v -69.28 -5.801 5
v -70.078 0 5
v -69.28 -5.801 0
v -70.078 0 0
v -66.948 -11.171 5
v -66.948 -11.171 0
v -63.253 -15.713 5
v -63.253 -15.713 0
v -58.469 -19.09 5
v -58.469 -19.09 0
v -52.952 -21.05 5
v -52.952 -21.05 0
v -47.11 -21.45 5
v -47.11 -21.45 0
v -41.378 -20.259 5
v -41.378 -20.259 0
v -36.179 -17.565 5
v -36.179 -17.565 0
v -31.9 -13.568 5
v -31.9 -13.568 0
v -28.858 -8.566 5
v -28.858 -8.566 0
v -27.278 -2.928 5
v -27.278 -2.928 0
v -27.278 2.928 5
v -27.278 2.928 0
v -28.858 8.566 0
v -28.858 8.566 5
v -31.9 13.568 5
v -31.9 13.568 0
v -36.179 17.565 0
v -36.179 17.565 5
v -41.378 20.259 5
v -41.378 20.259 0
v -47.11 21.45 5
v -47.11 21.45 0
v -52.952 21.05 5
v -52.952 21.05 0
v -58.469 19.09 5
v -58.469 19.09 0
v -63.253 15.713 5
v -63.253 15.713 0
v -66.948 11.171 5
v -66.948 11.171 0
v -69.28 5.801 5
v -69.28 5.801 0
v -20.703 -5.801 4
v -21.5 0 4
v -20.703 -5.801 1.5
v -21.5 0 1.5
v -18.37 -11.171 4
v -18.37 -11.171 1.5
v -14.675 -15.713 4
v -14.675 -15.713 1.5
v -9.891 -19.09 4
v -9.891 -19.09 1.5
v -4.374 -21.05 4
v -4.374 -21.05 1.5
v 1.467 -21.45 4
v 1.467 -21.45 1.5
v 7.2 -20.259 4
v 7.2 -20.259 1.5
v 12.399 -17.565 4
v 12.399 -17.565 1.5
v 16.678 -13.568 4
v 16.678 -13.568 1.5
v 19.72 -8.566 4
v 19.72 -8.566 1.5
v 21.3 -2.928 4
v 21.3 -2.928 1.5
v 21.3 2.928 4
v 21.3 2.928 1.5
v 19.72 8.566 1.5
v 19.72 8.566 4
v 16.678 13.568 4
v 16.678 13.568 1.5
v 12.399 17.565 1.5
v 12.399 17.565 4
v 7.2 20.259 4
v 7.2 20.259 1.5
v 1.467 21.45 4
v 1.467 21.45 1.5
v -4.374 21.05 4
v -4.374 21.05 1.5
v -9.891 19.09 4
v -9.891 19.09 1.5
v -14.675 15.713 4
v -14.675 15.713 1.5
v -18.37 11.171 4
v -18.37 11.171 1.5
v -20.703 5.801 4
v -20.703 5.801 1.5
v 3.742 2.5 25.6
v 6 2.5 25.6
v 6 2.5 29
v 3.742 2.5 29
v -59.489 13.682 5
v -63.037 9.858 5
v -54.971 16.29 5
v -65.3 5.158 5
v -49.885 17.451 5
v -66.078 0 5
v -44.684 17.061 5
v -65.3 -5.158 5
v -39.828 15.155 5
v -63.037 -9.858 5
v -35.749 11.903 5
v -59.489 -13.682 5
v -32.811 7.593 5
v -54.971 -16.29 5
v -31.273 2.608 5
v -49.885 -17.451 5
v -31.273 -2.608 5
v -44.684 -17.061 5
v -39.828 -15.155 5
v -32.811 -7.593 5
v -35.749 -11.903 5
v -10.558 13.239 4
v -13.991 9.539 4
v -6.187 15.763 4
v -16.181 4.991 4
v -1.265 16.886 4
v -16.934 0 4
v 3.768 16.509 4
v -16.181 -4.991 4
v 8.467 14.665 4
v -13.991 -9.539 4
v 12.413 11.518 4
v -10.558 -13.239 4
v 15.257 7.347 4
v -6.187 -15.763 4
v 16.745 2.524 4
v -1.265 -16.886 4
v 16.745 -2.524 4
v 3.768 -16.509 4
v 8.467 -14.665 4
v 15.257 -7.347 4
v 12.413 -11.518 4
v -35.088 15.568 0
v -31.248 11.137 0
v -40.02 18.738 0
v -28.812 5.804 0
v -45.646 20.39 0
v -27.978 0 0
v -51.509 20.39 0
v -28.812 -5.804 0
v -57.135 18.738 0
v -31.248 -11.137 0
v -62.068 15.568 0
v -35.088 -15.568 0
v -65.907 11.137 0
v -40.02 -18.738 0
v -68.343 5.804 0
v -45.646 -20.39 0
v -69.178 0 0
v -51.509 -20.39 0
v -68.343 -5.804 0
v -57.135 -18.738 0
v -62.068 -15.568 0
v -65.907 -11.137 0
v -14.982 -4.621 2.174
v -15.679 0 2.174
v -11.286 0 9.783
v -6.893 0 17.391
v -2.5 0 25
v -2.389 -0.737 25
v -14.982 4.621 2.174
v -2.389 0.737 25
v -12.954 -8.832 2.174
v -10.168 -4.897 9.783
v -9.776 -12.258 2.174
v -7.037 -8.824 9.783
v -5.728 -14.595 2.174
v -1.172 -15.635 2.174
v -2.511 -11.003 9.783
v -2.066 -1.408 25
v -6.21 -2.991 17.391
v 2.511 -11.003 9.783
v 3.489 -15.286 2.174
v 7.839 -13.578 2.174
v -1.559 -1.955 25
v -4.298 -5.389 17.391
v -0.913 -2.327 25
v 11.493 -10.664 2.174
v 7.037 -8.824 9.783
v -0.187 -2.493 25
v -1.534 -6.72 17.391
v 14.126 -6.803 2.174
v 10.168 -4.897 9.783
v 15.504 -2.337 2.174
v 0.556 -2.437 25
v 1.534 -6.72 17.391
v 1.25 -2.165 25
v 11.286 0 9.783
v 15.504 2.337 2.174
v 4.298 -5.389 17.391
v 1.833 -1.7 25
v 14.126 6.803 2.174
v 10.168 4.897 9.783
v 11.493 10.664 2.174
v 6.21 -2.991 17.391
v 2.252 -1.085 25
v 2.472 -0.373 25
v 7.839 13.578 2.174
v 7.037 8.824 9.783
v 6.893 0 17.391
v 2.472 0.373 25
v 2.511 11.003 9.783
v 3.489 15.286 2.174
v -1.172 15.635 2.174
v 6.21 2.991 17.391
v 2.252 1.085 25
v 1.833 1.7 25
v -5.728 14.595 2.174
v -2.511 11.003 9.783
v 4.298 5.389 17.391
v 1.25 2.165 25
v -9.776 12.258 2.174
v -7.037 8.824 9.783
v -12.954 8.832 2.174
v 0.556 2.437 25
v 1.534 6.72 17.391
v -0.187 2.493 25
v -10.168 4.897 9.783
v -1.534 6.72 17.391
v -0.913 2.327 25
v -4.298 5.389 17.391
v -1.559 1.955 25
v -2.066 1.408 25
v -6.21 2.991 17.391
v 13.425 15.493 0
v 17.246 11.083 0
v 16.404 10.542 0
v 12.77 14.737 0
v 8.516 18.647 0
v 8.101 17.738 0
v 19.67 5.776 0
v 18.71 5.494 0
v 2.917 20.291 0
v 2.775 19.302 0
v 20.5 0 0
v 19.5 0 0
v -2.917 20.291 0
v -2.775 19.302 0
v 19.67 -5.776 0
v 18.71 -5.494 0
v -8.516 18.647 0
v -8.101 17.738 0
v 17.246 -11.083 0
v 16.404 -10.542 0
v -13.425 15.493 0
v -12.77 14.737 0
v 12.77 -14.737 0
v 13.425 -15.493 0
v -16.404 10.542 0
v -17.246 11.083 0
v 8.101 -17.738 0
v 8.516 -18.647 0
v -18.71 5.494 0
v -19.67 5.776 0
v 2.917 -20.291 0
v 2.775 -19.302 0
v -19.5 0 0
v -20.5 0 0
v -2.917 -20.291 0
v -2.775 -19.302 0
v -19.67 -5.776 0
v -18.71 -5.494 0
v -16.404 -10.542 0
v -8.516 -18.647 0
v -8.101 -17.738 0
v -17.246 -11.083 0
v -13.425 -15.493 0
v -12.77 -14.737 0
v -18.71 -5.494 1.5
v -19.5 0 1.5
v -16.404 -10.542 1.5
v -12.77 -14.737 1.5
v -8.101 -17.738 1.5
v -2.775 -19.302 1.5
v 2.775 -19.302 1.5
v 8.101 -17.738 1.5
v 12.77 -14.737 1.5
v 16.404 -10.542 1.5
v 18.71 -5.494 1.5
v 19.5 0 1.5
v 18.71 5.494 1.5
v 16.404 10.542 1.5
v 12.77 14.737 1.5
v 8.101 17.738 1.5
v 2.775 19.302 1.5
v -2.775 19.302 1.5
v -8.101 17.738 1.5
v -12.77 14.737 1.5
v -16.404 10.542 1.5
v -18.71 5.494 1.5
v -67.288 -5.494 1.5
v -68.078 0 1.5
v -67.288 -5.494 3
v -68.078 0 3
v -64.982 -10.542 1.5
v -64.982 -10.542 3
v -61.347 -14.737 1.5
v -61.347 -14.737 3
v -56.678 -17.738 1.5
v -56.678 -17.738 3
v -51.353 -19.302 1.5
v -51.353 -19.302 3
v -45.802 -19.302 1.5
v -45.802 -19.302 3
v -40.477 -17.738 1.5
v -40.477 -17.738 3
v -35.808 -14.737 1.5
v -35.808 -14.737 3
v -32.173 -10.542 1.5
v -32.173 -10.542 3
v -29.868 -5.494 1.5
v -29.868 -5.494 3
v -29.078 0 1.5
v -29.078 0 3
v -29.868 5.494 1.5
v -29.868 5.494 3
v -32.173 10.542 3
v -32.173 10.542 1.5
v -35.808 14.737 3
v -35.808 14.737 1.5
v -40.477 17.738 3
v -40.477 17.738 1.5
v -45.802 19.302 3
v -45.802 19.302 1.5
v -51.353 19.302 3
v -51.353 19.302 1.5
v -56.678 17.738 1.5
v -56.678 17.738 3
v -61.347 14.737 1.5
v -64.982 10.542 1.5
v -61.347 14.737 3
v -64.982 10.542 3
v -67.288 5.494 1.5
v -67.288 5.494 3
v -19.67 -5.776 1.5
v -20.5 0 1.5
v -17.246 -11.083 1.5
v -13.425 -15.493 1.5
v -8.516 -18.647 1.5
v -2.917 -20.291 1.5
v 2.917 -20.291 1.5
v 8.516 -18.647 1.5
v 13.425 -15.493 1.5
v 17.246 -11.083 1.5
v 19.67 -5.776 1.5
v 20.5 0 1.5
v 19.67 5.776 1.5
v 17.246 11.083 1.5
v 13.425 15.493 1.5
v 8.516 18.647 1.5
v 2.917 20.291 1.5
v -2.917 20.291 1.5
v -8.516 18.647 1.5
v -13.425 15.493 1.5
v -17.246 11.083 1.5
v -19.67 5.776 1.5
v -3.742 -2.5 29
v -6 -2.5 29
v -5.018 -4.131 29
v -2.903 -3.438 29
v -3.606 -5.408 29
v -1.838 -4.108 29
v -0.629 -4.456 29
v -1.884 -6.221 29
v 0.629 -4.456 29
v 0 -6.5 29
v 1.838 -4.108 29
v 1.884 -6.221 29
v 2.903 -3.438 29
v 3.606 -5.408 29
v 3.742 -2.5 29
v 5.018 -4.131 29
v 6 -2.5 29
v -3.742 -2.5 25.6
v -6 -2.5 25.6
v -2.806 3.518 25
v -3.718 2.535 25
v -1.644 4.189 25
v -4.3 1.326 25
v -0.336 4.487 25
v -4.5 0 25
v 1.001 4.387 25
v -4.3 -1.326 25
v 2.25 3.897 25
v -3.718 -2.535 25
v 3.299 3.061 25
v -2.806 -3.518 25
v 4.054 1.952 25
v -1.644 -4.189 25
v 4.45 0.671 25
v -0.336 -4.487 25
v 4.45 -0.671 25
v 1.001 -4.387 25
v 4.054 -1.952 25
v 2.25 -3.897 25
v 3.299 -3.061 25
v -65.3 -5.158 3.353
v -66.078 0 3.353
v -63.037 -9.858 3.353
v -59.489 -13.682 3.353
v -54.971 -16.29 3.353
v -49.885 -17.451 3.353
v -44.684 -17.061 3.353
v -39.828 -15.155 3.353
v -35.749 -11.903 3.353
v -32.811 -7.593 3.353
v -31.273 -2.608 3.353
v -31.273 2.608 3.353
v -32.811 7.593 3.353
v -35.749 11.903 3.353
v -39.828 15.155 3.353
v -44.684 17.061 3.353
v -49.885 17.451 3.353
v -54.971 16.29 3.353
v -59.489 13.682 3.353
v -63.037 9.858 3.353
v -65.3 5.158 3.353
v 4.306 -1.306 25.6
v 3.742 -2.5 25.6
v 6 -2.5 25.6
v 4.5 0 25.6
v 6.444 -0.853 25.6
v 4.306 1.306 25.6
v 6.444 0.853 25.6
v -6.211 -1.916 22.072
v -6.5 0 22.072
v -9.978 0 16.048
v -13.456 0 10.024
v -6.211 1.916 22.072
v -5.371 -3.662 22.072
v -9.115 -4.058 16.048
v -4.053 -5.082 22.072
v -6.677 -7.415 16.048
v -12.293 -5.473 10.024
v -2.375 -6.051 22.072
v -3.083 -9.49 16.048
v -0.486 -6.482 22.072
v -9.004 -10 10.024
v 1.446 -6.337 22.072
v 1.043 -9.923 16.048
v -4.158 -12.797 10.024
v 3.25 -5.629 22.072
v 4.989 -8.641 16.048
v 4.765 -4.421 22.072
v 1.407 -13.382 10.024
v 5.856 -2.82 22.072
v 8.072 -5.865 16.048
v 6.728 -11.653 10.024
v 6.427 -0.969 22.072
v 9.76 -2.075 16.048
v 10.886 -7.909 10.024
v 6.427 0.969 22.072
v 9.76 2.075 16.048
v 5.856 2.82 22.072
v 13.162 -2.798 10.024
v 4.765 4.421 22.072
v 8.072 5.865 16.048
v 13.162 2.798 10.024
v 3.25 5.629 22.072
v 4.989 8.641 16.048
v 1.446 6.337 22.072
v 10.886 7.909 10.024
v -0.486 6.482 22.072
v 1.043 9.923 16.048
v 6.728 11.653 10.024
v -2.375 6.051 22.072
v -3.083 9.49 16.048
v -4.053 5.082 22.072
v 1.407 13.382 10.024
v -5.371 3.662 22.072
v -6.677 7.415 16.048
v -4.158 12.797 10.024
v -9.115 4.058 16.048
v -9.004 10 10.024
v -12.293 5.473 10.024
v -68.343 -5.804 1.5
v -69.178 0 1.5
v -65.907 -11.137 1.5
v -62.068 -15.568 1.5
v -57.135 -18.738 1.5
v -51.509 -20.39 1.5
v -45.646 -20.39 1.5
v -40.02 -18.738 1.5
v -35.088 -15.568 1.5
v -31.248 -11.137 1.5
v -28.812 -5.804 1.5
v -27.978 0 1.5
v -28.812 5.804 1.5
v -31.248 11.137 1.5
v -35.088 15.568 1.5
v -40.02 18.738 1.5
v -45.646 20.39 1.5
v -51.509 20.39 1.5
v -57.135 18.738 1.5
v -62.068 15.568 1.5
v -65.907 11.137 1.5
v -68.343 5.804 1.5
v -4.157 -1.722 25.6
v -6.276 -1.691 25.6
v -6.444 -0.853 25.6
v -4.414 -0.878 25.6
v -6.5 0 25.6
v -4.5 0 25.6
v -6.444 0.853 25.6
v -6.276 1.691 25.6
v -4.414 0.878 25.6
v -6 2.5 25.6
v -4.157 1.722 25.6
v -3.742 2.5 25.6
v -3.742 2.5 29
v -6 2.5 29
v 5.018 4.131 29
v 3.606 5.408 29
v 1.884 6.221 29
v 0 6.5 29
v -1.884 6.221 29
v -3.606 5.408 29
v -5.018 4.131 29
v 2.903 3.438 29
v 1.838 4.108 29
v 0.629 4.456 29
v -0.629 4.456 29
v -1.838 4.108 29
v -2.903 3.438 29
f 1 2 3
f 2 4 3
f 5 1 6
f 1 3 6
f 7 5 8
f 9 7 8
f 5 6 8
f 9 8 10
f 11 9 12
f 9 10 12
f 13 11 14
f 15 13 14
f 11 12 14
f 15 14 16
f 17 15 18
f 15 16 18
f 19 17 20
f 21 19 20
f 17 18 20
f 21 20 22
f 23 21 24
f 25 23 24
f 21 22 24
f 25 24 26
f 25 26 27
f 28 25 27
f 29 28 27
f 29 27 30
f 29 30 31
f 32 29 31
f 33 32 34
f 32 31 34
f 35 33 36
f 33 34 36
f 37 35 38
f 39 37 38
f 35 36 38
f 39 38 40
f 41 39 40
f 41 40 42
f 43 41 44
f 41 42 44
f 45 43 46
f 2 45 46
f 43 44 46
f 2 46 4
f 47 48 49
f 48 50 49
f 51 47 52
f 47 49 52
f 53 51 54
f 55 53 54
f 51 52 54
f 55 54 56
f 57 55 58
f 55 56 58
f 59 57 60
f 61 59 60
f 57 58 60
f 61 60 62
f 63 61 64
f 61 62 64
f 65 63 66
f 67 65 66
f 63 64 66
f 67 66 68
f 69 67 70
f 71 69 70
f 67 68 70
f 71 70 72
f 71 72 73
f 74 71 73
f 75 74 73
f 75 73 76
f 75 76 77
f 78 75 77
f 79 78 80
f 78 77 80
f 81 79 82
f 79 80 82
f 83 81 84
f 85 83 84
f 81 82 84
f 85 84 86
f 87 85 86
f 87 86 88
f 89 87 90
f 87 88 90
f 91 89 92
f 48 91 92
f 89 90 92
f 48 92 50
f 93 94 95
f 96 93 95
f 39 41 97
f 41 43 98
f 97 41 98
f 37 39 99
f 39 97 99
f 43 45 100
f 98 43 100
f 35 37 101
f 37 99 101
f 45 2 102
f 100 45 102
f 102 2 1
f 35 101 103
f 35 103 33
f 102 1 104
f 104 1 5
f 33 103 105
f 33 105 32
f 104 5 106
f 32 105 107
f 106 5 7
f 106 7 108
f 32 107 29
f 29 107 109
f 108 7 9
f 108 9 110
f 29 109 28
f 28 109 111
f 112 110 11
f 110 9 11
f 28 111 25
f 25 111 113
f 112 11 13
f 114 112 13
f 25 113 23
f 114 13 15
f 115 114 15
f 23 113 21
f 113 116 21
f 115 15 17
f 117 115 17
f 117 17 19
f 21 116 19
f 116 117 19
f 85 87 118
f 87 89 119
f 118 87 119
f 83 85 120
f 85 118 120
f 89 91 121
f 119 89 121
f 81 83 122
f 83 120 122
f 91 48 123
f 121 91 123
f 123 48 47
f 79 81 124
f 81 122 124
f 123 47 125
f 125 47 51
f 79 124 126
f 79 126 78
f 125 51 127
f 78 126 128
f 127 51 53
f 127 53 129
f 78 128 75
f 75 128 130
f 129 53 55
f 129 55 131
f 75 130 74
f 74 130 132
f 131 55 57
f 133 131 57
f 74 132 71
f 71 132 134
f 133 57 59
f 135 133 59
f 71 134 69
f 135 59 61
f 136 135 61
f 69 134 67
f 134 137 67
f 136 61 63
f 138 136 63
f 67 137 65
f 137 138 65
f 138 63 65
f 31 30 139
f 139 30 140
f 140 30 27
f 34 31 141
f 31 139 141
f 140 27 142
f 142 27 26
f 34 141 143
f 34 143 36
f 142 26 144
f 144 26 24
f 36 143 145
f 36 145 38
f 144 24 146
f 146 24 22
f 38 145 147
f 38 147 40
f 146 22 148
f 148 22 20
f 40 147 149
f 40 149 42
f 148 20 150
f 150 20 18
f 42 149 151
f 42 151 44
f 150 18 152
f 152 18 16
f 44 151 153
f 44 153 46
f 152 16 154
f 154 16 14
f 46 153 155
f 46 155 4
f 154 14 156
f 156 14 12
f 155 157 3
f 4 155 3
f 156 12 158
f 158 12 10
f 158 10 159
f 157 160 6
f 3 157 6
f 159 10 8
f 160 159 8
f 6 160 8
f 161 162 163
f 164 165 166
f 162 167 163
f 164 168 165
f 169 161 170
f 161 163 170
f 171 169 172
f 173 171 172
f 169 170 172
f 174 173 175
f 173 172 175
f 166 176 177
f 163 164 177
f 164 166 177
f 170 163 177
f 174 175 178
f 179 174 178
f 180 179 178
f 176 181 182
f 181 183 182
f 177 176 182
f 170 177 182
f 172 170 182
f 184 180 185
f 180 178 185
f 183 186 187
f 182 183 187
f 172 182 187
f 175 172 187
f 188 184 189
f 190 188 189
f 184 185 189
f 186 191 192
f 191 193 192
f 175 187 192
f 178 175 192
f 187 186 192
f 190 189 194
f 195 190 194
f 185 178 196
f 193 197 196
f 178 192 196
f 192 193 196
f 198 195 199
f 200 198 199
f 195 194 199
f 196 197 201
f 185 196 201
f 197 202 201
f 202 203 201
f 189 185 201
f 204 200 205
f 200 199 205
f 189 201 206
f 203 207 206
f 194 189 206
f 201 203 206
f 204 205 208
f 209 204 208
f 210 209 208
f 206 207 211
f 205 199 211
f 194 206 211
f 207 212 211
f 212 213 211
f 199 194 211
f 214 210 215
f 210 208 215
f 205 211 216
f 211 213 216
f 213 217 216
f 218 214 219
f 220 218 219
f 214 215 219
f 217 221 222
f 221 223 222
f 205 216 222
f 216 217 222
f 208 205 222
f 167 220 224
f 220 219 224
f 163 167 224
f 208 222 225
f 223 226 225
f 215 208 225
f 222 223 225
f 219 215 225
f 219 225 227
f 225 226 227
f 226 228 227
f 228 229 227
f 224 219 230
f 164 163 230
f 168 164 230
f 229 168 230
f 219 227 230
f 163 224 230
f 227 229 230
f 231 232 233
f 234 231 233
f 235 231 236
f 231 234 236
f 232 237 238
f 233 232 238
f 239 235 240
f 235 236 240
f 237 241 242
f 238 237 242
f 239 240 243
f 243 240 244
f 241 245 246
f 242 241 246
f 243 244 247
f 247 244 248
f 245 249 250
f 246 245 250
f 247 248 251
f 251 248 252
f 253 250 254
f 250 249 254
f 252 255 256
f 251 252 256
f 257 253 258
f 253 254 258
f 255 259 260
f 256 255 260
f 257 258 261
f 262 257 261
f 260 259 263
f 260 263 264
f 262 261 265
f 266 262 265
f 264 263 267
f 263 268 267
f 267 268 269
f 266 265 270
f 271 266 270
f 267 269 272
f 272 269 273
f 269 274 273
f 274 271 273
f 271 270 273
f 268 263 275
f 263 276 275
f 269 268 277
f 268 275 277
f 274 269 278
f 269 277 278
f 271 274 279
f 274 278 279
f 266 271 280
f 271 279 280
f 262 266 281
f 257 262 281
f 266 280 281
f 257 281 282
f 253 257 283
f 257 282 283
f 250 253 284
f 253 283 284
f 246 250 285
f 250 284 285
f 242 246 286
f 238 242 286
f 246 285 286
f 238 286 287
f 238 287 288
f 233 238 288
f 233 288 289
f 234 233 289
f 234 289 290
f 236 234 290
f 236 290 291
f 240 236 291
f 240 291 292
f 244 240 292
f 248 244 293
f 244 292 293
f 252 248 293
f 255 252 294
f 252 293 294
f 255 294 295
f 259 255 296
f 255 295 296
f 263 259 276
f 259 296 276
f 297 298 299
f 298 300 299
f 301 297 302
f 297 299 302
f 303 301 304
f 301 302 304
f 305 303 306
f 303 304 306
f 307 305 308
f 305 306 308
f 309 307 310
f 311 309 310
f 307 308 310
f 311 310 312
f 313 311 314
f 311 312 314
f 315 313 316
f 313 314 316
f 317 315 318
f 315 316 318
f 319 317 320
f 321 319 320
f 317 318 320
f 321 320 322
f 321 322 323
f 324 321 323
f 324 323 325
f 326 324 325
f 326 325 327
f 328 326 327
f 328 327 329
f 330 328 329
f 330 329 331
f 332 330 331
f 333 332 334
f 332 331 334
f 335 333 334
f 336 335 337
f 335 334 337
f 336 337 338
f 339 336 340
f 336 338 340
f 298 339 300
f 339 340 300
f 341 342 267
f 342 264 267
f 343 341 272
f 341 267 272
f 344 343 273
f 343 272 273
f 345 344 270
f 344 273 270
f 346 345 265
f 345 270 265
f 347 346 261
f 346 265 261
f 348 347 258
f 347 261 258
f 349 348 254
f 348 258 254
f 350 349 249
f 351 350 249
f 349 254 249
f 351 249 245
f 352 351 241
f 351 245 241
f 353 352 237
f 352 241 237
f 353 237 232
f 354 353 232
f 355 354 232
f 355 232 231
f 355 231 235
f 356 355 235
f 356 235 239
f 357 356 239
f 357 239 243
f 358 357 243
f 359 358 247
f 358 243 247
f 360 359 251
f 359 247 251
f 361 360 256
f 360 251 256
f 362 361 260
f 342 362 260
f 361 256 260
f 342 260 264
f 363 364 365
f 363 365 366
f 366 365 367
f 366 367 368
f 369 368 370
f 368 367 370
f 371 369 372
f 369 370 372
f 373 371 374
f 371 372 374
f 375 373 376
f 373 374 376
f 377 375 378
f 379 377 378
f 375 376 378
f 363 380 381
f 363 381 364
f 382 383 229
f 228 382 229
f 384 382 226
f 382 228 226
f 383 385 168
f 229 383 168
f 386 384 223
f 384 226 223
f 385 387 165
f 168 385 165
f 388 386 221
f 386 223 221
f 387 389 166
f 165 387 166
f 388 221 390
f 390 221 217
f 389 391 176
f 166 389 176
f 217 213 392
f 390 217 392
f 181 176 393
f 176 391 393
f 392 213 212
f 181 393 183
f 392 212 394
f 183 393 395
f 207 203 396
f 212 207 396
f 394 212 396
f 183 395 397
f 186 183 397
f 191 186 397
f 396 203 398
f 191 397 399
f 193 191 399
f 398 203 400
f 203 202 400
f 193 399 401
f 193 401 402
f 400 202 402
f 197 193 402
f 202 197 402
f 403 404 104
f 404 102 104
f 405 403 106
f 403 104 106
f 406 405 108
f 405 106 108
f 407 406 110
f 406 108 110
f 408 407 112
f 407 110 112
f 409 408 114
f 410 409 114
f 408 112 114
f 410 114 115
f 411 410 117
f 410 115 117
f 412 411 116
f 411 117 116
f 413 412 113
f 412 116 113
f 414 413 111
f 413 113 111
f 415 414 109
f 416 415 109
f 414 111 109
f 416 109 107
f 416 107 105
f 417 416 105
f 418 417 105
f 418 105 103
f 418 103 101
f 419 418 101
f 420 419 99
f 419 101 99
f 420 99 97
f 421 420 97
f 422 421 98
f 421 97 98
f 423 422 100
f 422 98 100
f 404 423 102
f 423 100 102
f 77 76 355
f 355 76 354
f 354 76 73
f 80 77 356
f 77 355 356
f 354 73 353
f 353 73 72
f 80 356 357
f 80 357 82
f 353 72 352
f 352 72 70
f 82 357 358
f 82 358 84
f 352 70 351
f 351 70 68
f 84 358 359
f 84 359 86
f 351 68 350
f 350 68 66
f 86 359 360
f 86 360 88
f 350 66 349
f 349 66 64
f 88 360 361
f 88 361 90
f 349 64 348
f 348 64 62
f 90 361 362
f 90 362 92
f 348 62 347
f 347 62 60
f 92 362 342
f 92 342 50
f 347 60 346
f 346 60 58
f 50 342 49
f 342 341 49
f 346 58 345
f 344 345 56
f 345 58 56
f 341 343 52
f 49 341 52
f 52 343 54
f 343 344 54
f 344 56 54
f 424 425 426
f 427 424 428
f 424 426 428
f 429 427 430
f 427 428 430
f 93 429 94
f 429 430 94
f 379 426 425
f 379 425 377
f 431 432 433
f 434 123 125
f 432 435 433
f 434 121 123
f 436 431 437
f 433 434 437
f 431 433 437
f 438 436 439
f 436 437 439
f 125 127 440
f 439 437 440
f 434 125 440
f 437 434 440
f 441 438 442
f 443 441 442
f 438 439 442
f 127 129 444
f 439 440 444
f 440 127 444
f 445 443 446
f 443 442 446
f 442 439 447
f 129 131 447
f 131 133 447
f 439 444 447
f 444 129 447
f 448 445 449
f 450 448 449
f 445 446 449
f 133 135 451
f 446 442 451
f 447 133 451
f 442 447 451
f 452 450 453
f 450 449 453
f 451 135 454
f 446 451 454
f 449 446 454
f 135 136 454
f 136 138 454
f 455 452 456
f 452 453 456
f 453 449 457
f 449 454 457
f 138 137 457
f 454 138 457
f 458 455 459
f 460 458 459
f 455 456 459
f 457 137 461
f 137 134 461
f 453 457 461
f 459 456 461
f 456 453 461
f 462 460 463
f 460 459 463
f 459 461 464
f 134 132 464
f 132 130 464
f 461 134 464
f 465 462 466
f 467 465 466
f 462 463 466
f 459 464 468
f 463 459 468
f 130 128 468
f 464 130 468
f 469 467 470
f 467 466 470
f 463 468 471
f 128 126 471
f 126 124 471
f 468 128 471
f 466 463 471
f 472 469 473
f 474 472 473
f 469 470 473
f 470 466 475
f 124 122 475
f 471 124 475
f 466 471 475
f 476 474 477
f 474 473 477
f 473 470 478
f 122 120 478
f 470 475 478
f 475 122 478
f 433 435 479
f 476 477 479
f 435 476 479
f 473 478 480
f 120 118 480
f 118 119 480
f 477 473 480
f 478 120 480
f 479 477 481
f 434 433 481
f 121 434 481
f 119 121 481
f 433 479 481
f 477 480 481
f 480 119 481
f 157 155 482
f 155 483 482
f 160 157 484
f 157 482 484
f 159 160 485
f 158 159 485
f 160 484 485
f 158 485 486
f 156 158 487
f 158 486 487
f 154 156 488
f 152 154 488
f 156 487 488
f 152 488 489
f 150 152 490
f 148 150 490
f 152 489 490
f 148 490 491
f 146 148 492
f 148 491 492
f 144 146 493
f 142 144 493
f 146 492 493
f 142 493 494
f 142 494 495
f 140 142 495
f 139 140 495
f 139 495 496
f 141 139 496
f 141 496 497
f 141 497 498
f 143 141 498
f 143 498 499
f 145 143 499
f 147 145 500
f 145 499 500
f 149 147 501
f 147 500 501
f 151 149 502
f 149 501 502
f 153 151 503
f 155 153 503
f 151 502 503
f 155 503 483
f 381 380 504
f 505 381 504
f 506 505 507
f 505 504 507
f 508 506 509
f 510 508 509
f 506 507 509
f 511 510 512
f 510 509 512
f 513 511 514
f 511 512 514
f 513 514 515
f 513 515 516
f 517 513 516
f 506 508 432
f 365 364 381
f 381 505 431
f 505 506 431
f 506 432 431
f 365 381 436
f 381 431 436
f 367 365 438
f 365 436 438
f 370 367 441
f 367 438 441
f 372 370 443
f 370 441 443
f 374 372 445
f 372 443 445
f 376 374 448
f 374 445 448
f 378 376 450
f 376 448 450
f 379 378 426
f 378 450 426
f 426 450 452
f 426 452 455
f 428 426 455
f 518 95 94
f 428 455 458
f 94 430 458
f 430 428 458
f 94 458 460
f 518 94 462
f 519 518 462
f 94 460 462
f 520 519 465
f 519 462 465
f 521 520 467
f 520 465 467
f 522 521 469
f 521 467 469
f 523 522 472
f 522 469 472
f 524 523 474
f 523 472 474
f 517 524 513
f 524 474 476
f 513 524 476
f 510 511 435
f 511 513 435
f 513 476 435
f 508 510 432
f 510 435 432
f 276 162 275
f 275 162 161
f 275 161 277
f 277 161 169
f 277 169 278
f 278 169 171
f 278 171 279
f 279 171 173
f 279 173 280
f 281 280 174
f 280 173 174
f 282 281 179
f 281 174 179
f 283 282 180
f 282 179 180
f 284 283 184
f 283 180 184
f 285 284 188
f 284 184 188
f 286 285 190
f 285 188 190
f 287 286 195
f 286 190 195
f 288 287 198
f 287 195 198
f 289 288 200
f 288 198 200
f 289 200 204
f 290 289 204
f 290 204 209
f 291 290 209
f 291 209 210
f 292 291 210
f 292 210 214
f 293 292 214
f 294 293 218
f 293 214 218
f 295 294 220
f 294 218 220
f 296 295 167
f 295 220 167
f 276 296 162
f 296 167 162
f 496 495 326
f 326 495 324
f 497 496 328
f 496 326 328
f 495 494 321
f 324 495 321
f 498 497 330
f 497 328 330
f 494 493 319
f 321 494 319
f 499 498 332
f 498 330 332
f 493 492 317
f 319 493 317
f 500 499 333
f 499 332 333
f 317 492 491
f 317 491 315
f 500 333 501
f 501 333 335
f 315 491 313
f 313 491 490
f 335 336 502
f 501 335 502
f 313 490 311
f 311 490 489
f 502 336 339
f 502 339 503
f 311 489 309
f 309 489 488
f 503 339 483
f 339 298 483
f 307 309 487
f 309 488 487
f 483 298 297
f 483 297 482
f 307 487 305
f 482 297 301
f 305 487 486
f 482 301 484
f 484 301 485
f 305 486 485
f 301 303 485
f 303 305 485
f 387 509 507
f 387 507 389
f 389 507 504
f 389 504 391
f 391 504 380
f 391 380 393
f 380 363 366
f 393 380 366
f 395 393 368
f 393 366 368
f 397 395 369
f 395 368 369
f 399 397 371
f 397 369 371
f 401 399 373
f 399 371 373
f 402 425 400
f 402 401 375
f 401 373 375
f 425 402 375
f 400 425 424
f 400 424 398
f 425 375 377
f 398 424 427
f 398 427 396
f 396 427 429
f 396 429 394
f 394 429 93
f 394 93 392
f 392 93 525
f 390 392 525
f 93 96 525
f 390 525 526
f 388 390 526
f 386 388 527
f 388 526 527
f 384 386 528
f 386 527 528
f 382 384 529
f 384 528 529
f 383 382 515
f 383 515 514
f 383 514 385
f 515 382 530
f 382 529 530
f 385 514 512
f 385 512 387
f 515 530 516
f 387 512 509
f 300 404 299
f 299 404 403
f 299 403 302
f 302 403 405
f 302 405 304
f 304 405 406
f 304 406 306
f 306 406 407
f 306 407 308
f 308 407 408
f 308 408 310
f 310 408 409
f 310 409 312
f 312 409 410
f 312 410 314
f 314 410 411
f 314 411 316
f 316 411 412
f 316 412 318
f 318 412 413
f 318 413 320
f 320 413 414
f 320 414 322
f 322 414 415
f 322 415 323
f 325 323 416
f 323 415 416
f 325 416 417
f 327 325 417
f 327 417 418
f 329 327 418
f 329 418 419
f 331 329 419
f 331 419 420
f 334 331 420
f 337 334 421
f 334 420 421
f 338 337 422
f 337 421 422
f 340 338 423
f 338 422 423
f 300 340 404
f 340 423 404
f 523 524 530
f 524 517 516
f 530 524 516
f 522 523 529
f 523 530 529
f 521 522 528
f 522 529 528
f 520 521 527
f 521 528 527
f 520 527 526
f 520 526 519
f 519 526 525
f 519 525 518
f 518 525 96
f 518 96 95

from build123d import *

# Parameters (mm, degrees)
F2_W     = 5
F2_H     = 8
F3_DEPTH = 7.5


with BuildPart() as f1:
    # F0 (on Front) → F1 (revolve)
    with BuildSketch(Plane.XZ):
        Polygon((-20.5, 0), (-19.5, 0), (-19.5, 1.5), (-15.678715, 2.173796), (-2.5, 25), (-4.5, 25), (-4.5, 29), (-6.5, 29), (-6.5, 22.071797), (-16.933757, 4), (-21.5, 4), (-21.5, 1.5), (-20.5, 1.5), align=None)
    revolve(axis=Axis((0, 0, 15.472903), (0, 0, 1)))

    # F2 (on Right) → F3 (cut, symmetric)
    with BuildSketch(Plane.YZ):
        with Locations((0, 29.6)):
            Rectangle(F2_W, F2_H)
    extrude(amount=F3_DEPTH, both=True, mode=Mode.SUBTRACT)


with BuildPart() as f5:
    # F4 (on Front) → F5 (revolve)
    with BuildSketch(Plane.XZ):
        Polygon((-66.077634, 5), (-70.077634, 5), (-70.077634, 0), (-69.177634, 0), (-69.177634, 1.5), (-68.077634, 1.5), (-68.077634, 3), (-66.077634, 3.352654), align=None)
    revolve(axis=Axis((-48.577634, 0, 5.398479), (0, 0, 1)))


solid = Compound([f1.part, f5.part])
